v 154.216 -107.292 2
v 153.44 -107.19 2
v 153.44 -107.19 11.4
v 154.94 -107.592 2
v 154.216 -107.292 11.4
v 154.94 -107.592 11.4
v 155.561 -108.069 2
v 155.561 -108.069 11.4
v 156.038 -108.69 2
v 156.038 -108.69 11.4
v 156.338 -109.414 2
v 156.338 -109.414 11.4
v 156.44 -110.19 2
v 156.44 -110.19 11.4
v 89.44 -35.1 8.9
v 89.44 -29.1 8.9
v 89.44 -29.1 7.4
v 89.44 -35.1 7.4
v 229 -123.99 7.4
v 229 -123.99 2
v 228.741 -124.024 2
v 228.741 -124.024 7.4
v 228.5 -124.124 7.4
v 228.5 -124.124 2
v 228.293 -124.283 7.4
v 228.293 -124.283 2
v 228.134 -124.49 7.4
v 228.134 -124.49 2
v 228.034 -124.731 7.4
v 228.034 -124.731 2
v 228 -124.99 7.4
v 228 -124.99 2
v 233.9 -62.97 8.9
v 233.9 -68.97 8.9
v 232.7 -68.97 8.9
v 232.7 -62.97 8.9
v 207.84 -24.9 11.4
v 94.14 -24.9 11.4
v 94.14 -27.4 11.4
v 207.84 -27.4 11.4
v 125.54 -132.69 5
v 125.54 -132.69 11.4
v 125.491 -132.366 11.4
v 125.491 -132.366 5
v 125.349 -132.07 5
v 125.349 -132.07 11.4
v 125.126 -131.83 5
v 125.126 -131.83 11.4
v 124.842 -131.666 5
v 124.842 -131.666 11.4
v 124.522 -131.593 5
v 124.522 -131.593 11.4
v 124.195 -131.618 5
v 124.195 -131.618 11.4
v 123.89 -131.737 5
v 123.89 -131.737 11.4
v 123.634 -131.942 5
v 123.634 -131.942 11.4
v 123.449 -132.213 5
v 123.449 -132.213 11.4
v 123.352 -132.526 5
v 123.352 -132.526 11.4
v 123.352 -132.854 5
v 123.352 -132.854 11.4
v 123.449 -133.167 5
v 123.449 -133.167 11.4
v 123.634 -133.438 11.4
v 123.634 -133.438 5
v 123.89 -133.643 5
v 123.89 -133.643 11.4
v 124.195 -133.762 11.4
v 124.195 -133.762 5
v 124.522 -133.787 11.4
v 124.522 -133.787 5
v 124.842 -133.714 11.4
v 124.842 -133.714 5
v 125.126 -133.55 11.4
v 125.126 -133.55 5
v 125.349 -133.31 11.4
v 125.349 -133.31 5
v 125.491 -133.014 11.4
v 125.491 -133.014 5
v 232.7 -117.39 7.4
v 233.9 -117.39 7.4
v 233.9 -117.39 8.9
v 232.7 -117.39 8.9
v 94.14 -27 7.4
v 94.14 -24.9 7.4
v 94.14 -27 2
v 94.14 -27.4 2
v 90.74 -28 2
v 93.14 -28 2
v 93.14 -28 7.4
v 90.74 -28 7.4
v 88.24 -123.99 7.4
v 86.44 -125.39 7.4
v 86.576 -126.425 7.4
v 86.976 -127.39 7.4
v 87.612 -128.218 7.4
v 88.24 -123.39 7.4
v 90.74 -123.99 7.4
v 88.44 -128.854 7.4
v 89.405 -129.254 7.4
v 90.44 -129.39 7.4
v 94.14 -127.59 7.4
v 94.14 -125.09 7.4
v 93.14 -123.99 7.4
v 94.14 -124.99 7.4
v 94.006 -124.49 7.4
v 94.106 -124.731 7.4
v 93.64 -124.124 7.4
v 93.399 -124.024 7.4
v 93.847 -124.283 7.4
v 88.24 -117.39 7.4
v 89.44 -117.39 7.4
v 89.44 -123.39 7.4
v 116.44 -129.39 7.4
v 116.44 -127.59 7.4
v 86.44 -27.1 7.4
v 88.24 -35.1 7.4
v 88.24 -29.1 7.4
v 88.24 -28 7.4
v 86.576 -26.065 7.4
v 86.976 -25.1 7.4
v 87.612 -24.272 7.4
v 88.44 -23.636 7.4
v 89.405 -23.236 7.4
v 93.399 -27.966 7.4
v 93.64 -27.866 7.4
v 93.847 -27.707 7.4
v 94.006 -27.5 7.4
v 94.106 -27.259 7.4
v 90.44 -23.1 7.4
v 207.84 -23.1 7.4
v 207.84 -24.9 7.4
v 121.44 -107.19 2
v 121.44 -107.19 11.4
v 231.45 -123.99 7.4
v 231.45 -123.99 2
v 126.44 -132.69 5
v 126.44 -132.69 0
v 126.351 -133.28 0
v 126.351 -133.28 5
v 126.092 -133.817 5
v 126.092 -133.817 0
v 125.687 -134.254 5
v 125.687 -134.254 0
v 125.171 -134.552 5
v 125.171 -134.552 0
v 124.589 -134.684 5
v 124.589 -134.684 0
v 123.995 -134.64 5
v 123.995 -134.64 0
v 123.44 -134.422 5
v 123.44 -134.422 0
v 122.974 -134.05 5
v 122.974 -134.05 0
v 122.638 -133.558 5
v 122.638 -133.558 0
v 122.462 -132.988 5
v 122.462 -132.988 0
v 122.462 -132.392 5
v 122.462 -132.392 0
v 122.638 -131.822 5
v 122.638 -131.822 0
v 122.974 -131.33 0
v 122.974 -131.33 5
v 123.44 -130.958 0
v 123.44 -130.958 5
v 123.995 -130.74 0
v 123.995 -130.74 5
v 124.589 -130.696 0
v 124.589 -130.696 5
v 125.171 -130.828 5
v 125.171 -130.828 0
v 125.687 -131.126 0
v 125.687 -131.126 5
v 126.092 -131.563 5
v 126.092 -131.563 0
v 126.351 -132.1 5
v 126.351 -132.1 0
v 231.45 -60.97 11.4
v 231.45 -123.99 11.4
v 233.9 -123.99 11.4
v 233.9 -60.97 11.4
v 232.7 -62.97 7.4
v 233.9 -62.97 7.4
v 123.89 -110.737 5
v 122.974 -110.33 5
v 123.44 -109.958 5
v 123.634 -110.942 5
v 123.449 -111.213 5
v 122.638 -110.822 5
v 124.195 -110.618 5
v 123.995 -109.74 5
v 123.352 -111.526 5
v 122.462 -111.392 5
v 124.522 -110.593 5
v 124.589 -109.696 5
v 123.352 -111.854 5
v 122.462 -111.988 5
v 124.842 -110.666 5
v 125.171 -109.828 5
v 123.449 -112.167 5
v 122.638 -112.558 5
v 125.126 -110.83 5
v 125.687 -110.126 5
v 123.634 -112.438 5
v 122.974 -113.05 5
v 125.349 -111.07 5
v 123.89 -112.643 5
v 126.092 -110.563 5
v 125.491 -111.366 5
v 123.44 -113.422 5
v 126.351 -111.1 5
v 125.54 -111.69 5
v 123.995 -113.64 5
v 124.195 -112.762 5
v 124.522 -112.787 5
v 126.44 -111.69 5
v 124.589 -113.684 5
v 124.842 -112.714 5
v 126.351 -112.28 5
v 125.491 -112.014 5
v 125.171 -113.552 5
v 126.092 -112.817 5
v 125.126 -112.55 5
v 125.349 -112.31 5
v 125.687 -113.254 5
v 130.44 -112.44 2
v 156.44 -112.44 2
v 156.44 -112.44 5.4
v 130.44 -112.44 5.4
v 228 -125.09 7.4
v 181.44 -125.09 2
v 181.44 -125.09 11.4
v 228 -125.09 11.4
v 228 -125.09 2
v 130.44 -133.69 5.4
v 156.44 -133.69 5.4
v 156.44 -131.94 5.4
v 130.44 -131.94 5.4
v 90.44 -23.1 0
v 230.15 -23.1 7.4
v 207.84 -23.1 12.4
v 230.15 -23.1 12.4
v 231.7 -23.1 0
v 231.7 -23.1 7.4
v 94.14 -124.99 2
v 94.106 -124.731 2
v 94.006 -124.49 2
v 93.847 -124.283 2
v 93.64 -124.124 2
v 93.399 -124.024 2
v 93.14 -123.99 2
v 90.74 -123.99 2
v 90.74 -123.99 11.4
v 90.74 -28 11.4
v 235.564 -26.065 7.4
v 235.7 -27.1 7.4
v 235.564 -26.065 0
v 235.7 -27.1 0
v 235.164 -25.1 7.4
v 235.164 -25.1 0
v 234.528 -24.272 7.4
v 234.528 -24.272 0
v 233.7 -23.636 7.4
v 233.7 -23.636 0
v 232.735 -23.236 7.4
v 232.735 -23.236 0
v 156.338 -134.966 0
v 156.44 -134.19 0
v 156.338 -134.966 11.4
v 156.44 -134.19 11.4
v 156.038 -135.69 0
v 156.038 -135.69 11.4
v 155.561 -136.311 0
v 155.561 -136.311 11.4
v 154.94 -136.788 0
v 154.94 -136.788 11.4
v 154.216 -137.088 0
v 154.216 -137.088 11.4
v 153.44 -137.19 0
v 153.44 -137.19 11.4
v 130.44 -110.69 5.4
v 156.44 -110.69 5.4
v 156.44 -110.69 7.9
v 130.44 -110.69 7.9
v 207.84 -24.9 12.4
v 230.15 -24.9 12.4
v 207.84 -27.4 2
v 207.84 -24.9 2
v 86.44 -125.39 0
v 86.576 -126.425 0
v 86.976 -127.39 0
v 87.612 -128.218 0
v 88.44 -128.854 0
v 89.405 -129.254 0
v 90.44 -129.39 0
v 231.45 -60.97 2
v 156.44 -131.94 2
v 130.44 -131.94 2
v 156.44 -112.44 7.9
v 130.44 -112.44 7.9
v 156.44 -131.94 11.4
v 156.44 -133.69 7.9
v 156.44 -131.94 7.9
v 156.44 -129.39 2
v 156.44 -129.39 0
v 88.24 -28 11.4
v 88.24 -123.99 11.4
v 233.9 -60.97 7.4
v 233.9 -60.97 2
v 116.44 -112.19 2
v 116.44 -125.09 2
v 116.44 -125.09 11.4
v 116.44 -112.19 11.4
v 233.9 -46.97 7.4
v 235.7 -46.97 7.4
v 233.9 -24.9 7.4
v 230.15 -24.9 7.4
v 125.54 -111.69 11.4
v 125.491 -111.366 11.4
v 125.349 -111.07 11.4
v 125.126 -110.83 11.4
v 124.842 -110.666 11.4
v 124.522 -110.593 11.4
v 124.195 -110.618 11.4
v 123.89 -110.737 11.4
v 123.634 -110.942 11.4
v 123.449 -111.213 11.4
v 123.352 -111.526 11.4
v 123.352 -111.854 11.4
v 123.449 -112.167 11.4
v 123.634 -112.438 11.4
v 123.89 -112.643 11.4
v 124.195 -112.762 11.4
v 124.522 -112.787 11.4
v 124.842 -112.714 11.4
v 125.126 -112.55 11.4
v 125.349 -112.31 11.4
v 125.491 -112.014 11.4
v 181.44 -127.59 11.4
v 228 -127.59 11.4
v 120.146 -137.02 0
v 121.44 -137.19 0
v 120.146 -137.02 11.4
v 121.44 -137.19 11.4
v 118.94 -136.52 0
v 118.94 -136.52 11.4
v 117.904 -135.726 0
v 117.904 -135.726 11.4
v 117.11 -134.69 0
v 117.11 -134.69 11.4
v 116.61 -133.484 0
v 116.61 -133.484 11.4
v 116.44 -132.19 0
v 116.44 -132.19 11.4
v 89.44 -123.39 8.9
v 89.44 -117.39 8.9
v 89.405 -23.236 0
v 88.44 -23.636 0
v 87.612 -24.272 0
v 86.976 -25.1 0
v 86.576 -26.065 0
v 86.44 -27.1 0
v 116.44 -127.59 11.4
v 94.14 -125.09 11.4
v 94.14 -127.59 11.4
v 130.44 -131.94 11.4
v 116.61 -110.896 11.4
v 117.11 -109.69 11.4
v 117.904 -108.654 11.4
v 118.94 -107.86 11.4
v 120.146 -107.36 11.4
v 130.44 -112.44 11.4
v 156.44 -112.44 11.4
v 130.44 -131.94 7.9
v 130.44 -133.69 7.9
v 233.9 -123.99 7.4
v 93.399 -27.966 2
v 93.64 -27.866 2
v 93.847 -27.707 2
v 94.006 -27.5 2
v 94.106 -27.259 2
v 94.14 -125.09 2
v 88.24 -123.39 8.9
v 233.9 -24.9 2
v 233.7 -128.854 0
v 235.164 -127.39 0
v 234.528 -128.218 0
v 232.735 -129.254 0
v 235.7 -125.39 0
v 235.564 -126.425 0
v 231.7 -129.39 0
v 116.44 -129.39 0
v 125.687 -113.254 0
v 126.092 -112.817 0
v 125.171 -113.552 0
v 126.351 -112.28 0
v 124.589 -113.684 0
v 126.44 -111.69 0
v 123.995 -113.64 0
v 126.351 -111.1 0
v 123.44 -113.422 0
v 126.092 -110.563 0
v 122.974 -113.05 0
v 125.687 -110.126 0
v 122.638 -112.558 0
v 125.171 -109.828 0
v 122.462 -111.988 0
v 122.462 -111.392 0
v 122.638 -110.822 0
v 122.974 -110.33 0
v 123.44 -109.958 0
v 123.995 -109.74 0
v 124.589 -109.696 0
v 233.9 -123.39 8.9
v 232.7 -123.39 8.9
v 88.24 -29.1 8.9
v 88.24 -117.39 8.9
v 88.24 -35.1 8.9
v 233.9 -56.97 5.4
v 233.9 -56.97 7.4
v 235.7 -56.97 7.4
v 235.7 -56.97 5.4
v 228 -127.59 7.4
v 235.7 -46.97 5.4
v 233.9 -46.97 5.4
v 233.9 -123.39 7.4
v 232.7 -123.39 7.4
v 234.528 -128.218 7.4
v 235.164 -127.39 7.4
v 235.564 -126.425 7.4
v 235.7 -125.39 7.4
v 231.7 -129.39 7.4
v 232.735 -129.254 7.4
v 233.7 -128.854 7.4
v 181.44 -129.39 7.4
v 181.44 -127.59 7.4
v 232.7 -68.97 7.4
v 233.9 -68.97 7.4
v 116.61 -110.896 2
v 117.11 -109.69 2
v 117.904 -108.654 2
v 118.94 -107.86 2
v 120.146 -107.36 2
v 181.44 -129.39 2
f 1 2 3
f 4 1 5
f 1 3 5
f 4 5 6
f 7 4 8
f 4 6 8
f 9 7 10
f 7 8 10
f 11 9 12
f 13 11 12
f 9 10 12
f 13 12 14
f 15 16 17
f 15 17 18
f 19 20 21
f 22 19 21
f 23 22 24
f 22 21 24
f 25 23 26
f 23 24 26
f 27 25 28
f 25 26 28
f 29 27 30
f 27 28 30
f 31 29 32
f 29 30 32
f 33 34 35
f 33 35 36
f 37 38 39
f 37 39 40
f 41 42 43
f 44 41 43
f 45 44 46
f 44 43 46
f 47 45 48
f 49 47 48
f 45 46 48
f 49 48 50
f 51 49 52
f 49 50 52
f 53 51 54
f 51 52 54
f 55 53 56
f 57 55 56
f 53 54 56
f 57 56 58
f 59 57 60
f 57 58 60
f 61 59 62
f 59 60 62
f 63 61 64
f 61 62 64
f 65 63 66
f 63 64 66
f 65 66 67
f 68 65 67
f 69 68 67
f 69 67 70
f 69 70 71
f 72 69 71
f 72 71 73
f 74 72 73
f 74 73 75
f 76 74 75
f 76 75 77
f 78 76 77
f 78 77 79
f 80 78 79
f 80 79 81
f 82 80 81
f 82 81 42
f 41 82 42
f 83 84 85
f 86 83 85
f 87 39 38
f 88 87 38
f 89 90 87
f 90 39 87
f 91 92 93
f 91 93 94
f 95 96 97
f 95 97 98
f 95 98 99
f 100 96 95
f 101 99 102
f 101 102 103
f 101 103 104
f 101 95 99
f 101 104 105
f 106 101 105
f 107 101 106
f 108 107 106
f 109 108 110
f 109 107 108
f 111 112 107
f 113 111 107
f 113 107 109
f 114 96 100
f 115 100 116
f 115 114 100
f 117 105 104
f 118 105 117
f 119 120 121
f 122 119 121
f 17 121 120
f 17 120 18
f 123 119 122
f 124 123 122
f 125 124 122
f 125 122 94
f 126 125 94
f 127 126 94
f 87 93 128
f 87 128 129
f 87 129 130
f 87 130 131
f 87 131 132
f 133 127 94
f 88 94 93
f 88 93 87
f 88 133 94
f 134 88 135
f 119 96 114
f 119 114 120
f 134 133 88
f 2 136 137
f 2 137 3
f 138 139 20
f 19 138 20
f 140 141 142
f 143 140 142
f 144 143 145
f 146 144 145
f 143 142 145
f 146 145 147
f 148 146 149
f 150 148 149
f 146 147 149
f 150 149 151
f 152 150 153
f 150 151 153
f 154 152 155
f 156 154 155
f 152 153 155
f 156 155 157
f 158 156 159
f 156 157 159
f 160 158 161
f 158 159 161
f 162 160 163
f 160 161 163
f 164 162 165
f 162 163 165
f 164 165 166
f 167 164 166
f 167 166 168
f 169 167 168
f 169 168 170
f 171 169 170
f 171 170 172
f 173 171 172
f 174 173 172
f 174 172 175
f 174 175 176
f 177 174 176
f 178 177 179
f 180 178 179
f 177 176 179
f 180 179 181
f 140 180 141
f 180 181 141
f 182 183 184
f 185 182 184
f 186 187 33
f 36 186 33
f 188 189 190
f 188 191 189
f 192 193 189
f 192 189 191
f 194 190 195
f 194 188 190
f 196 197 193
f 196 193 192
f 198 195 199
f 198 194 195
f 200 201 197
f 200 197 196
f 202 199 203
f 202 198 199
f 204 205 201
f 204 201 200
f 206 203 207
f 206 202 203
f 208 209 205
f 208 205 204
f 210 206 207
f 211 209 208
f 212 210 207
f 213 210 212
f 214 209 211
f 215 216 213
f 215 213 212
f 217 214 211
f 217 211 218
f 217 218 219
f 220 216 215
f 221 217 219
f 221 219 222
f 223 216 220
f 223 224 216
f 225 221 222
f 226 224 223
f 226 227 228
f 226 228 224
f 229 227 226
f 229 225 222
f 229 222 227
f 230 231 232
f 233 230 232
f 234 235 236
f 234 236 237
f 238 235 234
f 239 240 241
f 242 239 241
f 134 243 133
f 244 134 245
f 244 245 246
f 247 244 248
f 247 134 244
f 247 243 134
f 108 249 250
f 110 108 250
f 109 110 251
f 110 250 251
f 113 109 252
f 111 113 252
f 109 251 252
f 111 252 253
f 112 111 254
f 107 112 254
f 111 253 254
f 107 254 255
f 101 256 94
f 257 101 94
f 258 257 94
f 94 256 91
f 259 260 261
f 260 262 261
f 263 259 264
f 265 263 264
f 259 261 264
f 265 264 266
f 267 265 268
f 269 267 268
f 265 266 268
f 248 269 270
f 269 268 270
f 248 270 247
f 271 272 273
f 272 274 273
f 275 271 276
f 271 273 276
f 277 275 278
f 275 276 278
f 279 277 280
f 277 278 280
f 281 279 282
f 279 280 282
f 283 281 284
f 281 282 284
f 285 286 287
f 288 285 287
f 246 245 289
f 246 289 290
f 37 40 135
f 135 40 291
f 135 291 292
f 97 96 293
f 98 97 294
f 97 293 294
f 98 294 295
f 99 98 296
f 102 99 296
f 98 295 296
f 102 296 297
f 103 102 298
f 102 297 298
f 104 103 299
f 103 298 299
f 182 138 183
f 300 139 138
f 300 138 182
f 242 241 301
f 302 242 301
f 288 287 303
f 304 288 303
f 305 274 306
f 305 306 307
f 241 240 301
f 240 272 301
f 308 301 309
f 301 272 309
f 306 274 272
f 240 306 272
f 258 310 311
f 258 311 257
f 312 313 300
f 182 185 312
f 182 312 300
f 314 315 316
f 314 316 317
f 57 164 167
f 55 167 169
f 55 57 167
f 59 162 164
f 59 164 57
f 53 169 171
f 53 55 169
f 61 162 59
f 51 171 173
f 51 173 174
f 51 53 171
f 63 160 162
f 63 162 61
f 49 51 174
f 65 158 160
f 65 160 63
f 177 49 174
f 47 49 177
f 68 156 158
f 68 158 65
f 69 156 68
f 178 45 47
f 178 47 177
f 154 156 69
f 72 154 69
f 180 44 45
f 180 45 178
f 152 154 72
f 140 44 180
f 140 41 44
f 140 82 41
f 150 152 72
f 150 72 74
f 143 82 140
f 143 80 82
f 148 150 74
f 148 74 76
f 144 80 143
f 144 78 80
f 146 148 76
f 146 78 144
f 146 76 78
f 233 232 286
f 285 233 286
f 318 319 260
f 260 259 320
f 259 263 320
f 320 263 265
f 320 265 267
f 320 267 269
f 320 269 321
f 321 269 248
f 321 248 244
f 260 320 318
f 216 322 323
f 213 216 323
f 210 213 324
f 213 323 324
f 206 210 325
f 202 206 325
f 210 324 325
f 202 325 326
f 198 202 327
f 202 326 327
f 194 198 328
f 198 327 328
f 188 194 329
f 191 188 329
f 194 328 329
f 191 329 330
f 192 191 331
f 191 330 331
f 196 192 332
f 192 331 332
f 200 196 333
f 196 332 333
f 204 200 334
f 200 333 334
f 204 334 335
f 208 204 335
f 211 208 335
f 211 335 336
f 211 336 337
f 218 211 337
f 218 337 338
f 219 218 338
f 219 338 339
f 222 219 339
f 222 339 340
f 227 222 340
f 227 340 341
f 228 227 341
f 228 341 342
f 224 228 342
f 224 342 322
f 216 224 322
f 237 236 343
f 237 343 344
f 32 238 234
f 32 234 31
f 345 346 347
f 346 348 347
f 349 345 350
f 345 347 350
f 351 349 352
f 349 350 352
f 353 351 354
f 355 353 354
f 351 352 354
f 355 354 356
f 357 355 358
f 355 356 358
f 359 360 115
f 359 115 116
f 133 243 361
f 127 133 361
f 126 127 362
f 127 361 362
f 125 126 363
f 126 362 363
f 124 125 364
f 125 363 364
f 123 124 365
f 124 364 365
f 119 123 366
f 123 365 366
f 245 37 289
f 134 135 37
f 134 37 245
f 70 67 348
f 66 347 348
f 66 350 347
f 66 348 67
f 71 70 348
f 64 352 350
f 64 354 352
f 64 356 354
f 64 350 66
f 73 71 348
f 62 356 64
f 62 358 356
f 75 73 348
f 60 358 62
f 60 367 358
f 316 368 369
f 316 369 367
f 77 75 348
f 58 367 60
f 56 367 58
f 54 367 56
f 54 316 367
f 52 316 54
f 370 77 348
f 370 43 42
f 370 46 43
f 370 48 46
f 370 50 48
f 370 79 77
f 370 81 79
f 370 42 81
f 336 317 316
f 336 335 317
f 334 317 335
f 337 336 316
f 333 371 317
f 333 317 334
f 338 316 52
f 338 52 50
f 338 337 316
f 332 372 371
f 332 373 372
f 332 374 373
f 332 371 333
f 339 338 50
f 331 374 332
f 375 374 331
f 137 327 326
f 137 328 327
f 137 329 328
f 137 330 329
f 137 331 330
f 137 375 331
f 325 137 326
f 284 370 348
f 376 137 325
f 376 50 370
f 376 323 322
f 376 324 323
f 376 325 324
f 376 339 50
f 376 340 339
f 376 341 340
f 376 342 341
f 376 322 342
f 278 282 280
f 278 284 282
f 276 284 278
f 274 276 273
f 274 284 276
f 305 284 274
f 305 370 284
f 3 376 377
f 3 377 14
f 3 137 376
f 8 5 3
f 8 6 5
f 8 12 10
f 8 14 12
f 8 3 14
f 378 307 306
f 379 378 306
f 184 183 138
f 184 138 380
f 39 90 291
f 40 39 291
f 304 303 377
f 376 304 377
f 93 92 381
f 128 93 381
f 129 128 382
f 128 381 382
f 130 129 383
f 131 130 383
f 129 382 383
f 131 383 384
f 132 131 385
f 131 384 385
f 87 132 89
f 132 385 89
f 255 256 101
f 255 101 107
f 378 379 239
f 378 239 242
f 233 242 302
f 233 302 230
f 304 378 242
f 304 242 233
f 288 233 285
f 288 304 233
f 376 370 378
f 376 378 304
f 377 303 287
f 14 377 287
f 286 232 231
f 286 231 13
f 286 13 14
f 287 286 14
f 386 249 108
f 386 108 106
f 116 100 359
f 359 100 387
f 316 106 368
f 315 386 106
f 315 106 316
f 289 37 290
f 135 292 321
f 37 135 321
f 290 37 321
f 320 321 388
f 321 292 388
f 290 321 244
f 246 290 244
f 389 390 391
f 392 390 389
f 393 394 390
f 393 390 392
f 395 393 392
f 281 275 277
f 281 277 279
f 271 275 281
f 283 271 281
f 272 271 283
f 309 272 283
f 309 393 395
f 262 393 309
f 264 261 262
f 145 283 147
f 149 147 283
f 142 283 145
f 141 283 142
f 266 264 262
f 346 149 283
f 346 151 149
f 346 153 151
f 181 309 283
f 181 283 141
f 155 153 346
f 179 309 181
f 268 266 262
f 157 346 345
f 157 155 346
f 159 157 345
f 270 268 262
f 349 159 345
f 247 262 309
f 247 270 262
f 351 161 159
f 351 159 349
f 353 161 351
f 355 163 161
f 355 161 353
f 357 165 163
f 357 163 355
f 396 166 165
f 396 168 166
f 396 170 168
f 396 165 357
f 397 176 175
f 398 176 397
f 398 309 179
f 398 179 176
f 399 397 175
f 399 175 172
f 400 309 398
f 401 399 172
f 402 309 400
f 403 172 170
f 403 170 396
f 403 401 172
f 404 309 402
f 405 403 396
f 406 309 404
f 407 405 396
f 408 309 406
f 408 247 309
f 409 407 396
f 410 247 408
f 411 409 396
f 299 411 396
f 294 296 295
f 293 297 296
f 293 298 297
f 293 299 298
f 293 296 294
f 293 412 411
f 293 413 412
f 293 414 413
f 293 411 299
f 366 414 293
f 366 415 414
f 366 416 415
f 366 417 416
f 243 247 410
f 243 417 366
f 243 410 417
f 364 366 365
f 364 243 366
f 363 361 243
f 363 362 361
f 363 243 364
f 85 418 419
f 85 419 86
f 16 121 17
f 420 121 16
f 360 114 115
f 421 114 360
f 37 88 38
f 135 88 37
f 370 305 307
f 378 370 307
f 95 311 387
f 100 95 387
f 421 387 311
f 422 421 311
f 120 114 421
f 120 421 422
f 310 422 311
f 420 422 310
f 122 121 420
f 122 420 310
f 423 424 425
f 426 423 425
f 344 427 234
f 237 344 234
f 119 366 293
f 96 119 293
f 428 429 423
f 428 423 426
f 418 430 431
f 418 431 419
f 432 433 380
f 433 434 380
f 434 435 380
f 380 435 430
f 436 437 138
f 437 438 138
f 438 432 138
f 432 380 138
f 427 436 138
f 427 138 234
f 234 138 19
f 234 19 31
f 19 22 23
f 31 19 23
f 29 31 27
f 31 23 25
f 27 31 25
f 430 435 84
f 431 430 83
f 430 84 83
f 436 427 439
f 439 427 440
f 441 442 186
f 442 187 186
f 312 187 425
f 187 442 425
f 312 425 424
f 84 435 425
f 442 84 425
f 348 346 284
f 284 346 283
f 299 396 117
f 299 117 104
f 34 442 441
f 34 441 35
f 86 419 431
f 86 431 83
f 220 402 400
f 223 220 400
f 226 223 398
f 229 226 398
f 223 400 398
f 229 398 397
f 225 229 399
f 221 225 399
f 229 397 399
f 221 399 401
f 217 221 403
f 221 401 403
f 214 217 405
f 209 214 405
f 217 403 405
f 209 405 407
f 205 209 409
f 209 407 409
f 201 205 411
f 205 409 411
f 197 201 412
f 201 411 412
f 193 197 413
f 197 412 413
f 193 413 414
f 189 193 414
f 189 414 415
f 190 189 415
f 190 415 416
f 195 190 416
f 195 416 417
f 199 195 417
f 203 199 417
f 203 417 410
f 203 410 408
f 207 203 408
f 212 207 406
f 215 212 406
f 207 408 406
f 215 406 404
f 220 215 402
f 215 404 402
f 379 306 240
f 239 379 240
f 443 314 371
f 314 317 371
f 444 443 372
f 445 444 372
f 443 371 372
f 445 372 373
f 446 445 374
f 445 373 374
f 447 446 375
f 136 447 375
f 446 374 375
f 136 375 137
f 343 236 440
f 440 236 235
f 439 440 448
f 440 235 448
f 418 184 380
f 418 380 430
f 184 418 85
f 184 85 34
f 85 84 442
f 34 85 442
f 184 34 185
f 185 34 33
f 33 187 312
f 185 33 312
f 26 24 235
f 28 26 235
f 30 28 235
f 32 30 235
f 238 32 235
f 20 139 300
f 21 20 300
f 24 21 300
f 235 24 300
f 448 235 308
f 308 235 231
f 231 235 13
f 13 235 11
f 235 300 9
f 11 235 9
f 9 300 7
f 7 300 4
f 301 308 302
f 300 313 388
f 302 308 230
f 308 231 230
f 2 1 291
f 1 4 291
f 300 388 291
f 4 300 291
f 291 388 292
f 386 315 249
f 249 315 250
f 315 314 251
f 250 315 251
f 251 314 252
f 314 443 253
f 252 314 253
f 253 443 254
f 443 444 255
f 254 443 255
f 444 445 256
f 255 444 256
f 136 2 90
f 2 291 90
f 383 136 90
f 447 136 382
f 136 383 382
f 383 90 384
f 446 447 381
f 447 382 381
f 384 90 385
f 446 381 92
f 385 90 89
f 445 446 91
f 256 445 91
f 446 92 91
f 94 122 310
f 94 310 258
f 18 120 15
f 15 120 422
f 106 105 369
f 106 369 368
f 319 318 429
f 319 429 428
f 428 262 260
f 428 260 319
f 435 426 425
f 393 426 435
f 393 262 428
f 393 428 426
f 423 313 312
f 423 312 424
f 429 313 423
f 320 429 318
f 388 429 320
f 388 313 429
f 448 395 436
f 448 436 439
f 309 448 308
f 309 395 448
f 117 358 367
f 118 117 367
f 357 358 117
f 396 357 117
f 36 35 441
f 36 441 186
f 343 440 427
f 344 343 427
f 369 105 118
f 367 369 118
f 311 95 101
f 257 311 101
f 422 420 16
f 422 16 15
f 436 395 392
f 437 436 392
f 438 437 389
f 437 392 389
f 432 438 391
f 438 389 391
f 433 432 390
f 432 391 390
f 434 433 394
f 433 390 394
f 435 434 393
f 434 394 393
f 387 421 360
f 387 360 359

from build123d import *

# Parameters (mm, degrees)
PAD010_DEPTH    = 2
PAD011_DEPTH    = 5.4
SKETCH023_W     = 40
SKETCH023_H     = 30
SKETCH023_W_2   = 2.5
SKETCH023_H_2   = 95.99
SKETCH023_W_3   = 113.7
SKETCH023_H_3   = 2.5
SKETCH023_W_4   = 22.3
SKETCH023_W_5   = 46.56
SKETCH023_W_6   = 2.45
SKETCH023_H_4   = 75.89
PAD012_DEPTH    = 9.4
POCKET_DEPTH    = 26
SKETCH025_W     = 15
SKETCH025_H     = 10
POCKET008_DEPTH = 6
SKETCH028_W     = 22.31
SKETCH028_H     = 1.8
PAD015_DEPTH    = 10.4
FILLET_R        = 5
FILLET001_R     = 3
SKETCH035_W     = 6
SKETCH035_H     = 1.5
POCKET011_DEPTH = 1.2
SKETCH036_W     = 6
SKETCH036_H     = 1.5
POCKET012_DEPTH = 1.2
SKETCH037_R     = 1.1
POCKET013_DEPTH = 12
SKETCH038_R     = 2
POCKET014_DEPTH = 5
SKETCH051_W     = 2.45
SKETCH051_H     = 4
POCKET023_DEPTH = 4
SKETCH055_W     = 2.45
SKETCH055_H     = 5.4
POCKET024_DEPTH = 12.87


with BuildPart() as part:
    # Sketch020 → Pad010 (new body)
    with BuildSketch(Plane.XY):
        with BuildLine():
            Line((235.7, -27.1), (235.7, -125.39))
            ThreePointArc((231.7, -129.39), (234.528427, -128.218427), (235.7, -125.39))
            Line((156.44, -129.39), (231.7, -129.39))
            Line((156.44, -129.39), (156.44, -137.19))
            Line((116.44, -137.19), (156.44, -137.19))
            Line((116.44, -129.39), (116.44, -137.19))
            Line((116.44, -129.39), (90.44, -129.39))
            ThreePointArc((86.44, -125.39), (87.611573, -128.218427), (90.44, -129.39))
            Line((86.44, -27.1), (86.44, -125.39))
            ThreePointArc((90.44, -23.1), (87.611573, -24.271573), (86.44, -27.1))
            Line((90.44, -23.1), (231.7, -23.1))
            ThreePointArc((235.7, -27.1), (234.528427, -24.271573), (231.7, -23.1))
        make_face()
    extrude(amount=PAD010_DEPTH)

    # Sketch021 (on Face14 of Pad010) → Pad011 (join)
    with BuildSketch(Plane.XY.offset(2)):
        with BuildLine():
            Line((235.7, -27.1), (235.7, -125.39))
            ThreePointArc((231.7, -129.39), (234.528427, -128.218427), (235.7, -125.39))
            Line((231.7, -129.39), (181.44, -129.39))
            Line((181.44, -127.59), (181.44, -129.39))
            Line((228, -127.59), (181.44, -127.59))
            Line((228, -127.59), (228, -124.99))
            ThreePointArc((229, -123.99), (228.292893, -124.282893), (228, -124.99))
            Line((233.9, -123.99), (229, -123.99))
            Line((233.9, -123.99), (233.9, -24.9))
            Line((230.15, -24.9), (233.9, -24.9))
            Line((230.15, -24.9), (230.15, -23.1))
            Line((230.15, -23.1), (231.7, -23.1))
            ThreePointArc((235.7, -27.1), (234.528427, -24.271573), (231.7, -23.1))
        make_face()
        with BuildLine():
            Line((86.44, -27.1), (86.44, -125.39))
            ThreePointArc((86.44, -125.39), (87.611573, -128.218427), (90.44, -129.39))
            Line((90.44, -129.39), (116.44, -129.39))
            Line((116.44, -129.39), (116.44, -127.59))
            Line((116.44, -127.59), (94.14, -127.59))
            Line((94.14, -124.99), (94.14, -127.59))
            ThreePointArc((94.14, -124.99), (93.847107, -124.282893), (93.14, -123.99))
            Line((88.24, -123.99), (93.14, -123.99))
            Line((88.24, -28), (88.24, -123.99))
            Line((93.14, -28), (88.24, -28))
            ThreePointArc((93.14, -28), (93.847107, -27.707107), (94.14, -27))
            Line((94.14, -24.9), (94.14, -27))
            Line((207.84, -24.9), (94.14, -24.9))
            Line((207.84, -24.9), (207.84, -23.1))
            Line((90.44, -23.1), (207.84, -23.1))
            ThreePointArc((90.44, -23.1), (87.611573, -24.271573), (86.44, -27.1))
        make_face()
    extrude(amount=PAD011_DEPTH)

    # Sketch023 (on Face3 of Pad011) → Pad012 (join)
    with BuildSketch(Plane.XY.offset(2)):
        with Locations((136.44, -122.19)):
            Rectangle(SKETCH023_W, SKETCH023_H)
        with Locations((89.49, -75.995)):
            Rectangle(SKETCH023_W_2, SKETCH023_H_2)
        with Locations((150.99, -26.15)):
            Rectangle(SKETCH023_W_3, SKETCH023_H_3)
        with Locations((105.29, -126.34)):
            Rectangle(SKETCH023_W_4, SKETCH023_H_3)
        with Locations((204.72, -126.34)):
            Rectangle(SKETCH023_W_5, SKETCH023_H_3)
        with Locations((232.675, -86.045)):
            Rectangle(SKETCH023_W_6, SKETCH023_H_4)
    extrude(amount=PAD012_DEPTH)

    # Sketch024 (on Face48 of Pad012) → Pocket (cut)
    with BuildSketch(Plane.YZ.offset(156.44)):
        Polygon((-131.94, 5.4), (-131.94, 2), (-112.44, 2), (-112.44, 5.4), (-110.69, 5.4), (-110.69, 7.9), (-112.44, 7.9), (-112.44, 11.4), (-131.94, 11.4), (-131.94, 7.9), (-133.69, 7.9), (-133.69, 5.4), align=None)
    extrude(amount=-POCKET_DEPTH, mode=Mode.SUBTRACT)

    # Sketch025 (on Face61 of Pocket) → Pocket008 (cut)
    with BuildSketch(Plane.XY.offset(11.4)):
        with Locations((232.43, -51.97)):
            Rectangle(SKETCH025_W, SKETCH025_H)
    extrude(amount=-POCKET008_DEPTH, mode=Mode.SUBTRACT)

    # Sketch028 (on Face16 of Pocket008) → Pad015 (join)
    with BuildSketch(Plane.XY.offset(2)):
        with Locations((218.995, -24)):
            Rectangle(SKETCH028_W, SKETCH028_H)
    extrude(amount=PAD015_DEPTH)

    # Fillet
    fillet_edges = [part.edges().sort_by_distance(p)[0] for p in [
        (116.44, -137.19, 5.7),
        (116.44, -107.19, 6.7),
    ]]
    fillet(fillet_edges, radius=FILLET_R)

    # Fillet001
    fillet001_edges = [part.edges().sort_by_distance(p)[0] for p in [
        (156.44, -137.19, 5.7),
        (156.44, -107.19, 6.7),
    ]]
    fillet(fillet001_edges, radius=FILLET001_R)

    # Sketch035 (on Face12 of Fillet001) → Pocket011 (cut)
    with BuildSketch(Plane(origin=(88.24, 0, 0), x_dir=(0, -1, 0), z_dir=(-1, 0, 0))):
        with Locations((32.1, 8.15)):
            Rectangle(SKETCH035_W, SKETCH035_H)
        with Locations((120.39, 8.15)):
            Rectangle(SKETCH035_W, SKETCH035_H)
    extrude(amount=-POCKET011_DEPTH, mode=Mode.SUBTRACT)

    # Sketch036 (on Face68 of Pocket011) → Pocket012 (cut)
    with BuildSketch(Plane.YZ.offset(233.9)):
        with Locations((-120.39, 8.15)):
            Rectangle(SKETCH036_W, SKETCH036_H)
        with Locations((-65.97, 8.15)):
            Rectangle(SKETCH036_W, SKETCH036_H)
    extrude(amount=-POCKET012_DEPTH, mode=Mode.SUBTRACT)

    # Sketch037 (on Face16 of Pocket012) → Pocket013 (cut)
    with BuildSketch(Plane.XY.offset(11.4)):
        with Locations((124.44, -111.69)):
            Circle(SKETCH037_R)
        with Locations((124.44, -132.69)):
            Circle(SKETCH037_R)
    extrude(amount=-POCKET013_DEPTH, mode=Mode.SUBTRACT)

    # Sketch038 (on Face1 of Pocket013) → Pocket014 (cut)
    with BuildSketch(Plane(origin=(0, 0, 0), x_dir=(1, 0, 0), z_dir=(0, 0, -1))):
        with Locations((124.44, 132.69)):
            Circle(SKETCH038_R)
        with Locations((124.44, 111.69)):
            Circle(SKETCH038_R)
    extrude(amount=-POCKET014_DEPTH, mode=Mode.SUBTRACT)

    # Sketch051 (on Face29 of Pocket014) → Pocket023 (cut)
    with BuildSketch(Plane(origin=(0, -56.97, 0), x_dir=(-1, 0, 0), z_dir=(0, 1, 0))):
        with Locations((-232.675, 9.4)):
            Rectangle(SKETCH051_W, SKETCH051_H)
    extrude(amount=-POCKET023_DEPTH, mode=Mode.SUBTRACT)

    # Sketch055 (on Face72 of Pocket023) → Pocket024 (cut)
    with BuildSketch(Plane(origin=(0, -48.1, 0), x_dir=(-1, 0, 0), z_dir=(0, 1, 0))):
        with Locations((-232.675, 4.7)):
            Rectangle(SKETCH055_W, SKETCH055_H)
    extrude(amount=-POCKET024_DEPTH, mode=Mode.SUBTRACT)


solid = part.part
